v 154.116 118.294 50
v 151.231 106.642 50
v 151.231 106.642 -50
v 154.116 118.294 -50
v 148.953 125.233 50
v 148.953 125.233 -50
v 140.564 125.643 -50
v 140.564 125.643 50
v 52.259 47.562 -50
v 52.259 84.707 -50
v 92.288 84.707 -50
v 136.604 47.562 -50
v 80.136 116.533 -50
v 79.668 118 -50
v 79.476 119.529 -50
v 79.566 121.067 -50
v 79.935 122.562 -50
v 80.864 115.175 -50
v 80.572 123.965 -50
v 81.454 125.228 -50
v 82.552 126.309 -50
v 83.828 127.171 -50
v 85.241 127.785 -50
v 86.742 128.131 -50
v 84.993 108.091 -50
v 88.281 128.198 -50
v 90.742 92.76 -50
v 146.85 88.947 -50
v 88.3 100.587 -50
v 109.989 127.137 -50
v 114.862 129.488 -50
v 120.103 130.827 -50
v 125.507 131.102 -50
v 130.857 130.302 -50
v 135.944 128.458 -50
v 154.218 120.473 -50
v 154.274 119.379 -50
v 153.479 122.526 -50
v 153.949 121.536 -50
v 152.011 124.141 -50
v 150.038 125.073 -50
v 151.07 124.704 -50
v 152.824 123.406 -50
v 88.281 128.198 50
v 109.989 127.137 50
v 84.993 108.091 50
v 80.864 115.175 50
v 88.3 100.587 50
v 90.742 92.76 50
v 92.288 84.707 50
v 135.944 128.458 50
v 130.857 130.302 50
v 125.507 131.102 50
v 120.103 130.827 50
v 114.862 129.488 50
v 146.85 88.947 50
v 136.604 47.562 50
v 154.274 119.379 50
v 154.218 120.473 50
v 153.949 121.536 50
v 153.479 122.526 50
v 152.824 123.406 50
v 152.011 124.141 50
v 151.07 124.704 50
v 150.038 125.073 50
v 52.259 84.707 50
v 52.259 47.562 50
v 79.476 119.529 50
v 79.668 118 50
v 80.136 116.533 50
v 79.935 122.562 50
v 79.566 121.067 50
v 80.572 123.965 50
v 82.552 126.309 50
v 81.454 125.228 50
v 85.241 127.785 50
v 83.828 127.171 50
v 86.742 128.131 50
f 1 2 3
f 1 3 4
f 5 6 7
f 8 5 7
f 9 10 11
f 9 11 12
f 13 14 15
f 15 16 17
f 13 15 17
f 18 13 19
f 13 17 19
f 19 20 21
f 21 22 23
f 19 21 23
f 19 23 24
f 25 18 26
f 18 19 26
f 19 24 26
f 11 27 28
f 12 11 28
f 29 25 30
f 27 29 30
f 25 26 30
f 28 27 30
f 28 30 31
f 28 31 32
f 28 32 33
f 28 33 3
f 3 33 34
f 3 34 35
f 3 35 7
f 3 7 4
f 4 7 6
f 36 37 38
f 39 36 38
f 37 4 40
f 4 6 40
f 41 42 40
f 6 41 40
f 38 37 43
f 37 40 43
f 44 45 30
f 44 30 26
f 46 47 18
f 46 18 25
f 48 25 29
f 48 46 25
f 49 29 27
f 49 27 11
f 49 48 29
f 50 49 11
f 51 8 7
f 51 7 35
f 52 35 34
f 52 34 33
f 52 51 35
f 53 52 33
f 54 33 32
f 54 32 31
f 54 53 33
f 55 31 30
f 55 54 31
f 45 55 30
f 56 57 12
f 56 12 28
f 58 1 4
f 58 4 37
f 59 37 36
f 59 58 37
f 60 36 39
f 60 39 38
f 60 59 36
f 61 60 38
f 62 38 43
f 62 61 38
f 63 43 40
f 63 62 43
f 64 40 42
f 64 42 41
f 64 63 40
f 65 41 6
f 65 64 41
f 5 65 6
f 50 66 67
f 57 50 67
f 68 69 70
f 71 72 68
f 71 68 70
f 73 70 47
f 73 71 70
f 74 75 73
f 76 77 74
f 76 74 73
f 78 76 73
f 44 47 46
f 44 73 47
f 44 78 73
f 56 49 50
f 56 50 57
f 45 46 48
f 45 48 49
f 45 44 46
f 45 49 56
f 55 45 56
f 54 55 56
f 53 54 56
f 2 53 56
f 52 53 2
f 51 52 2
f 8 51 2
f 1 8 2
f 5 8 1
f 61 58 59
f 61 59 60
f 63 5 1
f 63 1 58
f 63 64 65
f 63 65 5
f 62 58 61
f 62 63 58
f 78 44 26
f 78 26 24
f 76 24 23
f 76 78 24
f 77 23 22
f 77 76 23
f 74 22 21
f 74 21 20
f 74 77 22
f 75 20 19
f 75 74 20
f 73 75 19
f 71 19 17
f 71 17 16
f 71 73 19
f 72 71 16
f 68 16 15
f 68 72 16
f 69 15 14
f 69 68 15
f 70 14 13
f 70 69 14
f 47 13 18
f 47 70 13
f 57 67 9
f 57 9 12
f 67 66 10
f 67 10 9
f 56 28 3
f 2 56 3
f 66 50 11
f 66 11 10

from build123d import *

# Parameters (mm, degrees)
EXTRUDE_1_DEPTH                = 50
SPLIT_BODIES_1_SURFACE_1_BACK  = 226.829
SPLIT_BODIES_1_SURFACE_1_DEPTH = 453.658
SPLIT_BODIES_1_SURFACE_2_BACK  = 226.829
SPLIT_BODIES_1_SURFACE_2_DEPTH = 453.658


with BuildPart() as part:
    # 草图2 → 凸台-拉伸1 (new, symmetric)
    with BuildSketch(Plane.XY):
        with BuildLine():
            Line((120.381757685, 47.561632043), (136.603924057, 47.561632043))
            Line((136.603924057, 47.561632043), (146.850265064, 88.947420909))
            ThreePointArc((146.850265064, 88.947420909), (104.62030332, 85.070472378), (109.988846824, 127.136838271))
            Line((109.988846824, 127.136838271), (88.280849451, 128.197534042))
            ThreePointArc((88.280849451, 128.197534042), (80.571822415, 123.964886157), (80.863683371, 115.175163571))
            ThreePointArc((80.863683371, 115.175163571), (88.300101913, 100.587398022), (92.288223879, 84.706651578))
            Line((92.288223879, 84.706651578), (52.259104564, 84.706651578))
            Line((52.259104564, 84.706651578), (52.259104564, 37.347972633))
            Line((52.259104564, 37.347972633), (26.12059868, 28.530814049))
            Line((26.12059868, 28.530814049), (0, 28.530814049))
            Line((0, 28.530814049), (0, 0))
            Line((0, 0), (140.98, 0))
            Line((140.98, 0), (131.928221984, 26.834036233))
            Line((131.928221984, 26.834036233), (115.249995775, 26.834036233))
            Line((115.249995775, 26.834036233), (120.381757685, 47.561632043))
        make_face()
        with BuildLine():
            ThreePointArc((109.988846824, 127.136838271), (104.62030332, 85.070472378), (146.850265064, 88.947420909))
            Line((146.850265064, 88.947420909), (151.231226865, 106.642475172))
            ThreePointArc((151.231226865, 106.642475172), (147.884639105, 117.258207331), (140.564064785, 125.64287253))
            Line((140.564064785, 125.64287253), (109.988846824, 127.136838271))
        make_face()
        with BuildLine():
            ThreePointArc((140.564064785, 125.64287253), (125.506724817, 131.102497099), (109.988846824, 127.136838271))
            Line((109.988846824, 127.136838271), (140.564064785, 125.64287253))
        make_face()
        with BuildLine():
            ThreePointArc((140.564064785, 125.64287253), (147.884639105, 117.258207331), (151.231226865, 106.642475172))
            Line((151.231226865, 106.642475172), (154.115877694, 118.293810031))
            ThreePointArc((154.115877694, 118.293810031), (153.172952645, 122.982290954), (148.95330104, 125.232957822))
            Line((148.95330104, 125.232957822), (140.564064785, 125.64287253))
        make_face()
    extrude(amount=EXTRUDE_1_DEPTH, both=True)


with BuildPart() as body_2:
    # Split Bodies 1: the piece behind the surface
    add(part.part)
    # Split Bodies 1 surface: a surface, the sketch's curves swept straight by 453.658 mm
    with BuildLine(Plane.XY.offset(50).offset(-SPLIT_BODIES_1_SURFACE_1_BACK), mode=Mode.PRIVATE) as split_bodies_1_surface_1_path:
        Line((120.381757685, 47.561632043), (52.259104564, 47.561632043))
    split_bodies_1_surface_1 = Shell.extrude(split_bodies_1_surface_1_path.wire(), (0 * SPLIT_BODIES_1_SURFACE_1_DEPTH, 0 * SPLIT_BODIES_1_SURFACE_1_DEPTH, 1 * SPLIT_BODIES_1_SURFACE_1_DEPTH))
    split(bisect_by=split_bodies_1_surface_1, keep=Keep.BOTTOM)


with BuildPart() as part_1:
    add(part.part)

    # Split Bodies 1: split by a surface, the side it looks to stays
    # Split Bodies 1 surface: a surface, the sketch's curves swept straight by 453.658 mm
    with BuildLine(Plane.XY.offset(50).offset(-SPLIT_BODIES_1_SURFACE_2_BACK), mode=Mode.PRIVATE) as split_bodies_1_surface_2_path:
        Line((120.381757685, 47.561632043), (52.259104564, 47.561632043))
    split_bodies_1_surface_2 = Shell.extrude(split_bodies_1_surface_2_path.wire(), (0 * SPLIT_BODIES_1_SURFACE_2_DEPTH, 0 * SPLIT_BODIES_1_SURFACE_2_DEPTH, 1 * SPLIT_BODIES_1_SURFACE_2_DEPTH))
    split(bisect_by=split_bodies_1_surface_2, keep=Keep.TOP)


solid = body_2.part
